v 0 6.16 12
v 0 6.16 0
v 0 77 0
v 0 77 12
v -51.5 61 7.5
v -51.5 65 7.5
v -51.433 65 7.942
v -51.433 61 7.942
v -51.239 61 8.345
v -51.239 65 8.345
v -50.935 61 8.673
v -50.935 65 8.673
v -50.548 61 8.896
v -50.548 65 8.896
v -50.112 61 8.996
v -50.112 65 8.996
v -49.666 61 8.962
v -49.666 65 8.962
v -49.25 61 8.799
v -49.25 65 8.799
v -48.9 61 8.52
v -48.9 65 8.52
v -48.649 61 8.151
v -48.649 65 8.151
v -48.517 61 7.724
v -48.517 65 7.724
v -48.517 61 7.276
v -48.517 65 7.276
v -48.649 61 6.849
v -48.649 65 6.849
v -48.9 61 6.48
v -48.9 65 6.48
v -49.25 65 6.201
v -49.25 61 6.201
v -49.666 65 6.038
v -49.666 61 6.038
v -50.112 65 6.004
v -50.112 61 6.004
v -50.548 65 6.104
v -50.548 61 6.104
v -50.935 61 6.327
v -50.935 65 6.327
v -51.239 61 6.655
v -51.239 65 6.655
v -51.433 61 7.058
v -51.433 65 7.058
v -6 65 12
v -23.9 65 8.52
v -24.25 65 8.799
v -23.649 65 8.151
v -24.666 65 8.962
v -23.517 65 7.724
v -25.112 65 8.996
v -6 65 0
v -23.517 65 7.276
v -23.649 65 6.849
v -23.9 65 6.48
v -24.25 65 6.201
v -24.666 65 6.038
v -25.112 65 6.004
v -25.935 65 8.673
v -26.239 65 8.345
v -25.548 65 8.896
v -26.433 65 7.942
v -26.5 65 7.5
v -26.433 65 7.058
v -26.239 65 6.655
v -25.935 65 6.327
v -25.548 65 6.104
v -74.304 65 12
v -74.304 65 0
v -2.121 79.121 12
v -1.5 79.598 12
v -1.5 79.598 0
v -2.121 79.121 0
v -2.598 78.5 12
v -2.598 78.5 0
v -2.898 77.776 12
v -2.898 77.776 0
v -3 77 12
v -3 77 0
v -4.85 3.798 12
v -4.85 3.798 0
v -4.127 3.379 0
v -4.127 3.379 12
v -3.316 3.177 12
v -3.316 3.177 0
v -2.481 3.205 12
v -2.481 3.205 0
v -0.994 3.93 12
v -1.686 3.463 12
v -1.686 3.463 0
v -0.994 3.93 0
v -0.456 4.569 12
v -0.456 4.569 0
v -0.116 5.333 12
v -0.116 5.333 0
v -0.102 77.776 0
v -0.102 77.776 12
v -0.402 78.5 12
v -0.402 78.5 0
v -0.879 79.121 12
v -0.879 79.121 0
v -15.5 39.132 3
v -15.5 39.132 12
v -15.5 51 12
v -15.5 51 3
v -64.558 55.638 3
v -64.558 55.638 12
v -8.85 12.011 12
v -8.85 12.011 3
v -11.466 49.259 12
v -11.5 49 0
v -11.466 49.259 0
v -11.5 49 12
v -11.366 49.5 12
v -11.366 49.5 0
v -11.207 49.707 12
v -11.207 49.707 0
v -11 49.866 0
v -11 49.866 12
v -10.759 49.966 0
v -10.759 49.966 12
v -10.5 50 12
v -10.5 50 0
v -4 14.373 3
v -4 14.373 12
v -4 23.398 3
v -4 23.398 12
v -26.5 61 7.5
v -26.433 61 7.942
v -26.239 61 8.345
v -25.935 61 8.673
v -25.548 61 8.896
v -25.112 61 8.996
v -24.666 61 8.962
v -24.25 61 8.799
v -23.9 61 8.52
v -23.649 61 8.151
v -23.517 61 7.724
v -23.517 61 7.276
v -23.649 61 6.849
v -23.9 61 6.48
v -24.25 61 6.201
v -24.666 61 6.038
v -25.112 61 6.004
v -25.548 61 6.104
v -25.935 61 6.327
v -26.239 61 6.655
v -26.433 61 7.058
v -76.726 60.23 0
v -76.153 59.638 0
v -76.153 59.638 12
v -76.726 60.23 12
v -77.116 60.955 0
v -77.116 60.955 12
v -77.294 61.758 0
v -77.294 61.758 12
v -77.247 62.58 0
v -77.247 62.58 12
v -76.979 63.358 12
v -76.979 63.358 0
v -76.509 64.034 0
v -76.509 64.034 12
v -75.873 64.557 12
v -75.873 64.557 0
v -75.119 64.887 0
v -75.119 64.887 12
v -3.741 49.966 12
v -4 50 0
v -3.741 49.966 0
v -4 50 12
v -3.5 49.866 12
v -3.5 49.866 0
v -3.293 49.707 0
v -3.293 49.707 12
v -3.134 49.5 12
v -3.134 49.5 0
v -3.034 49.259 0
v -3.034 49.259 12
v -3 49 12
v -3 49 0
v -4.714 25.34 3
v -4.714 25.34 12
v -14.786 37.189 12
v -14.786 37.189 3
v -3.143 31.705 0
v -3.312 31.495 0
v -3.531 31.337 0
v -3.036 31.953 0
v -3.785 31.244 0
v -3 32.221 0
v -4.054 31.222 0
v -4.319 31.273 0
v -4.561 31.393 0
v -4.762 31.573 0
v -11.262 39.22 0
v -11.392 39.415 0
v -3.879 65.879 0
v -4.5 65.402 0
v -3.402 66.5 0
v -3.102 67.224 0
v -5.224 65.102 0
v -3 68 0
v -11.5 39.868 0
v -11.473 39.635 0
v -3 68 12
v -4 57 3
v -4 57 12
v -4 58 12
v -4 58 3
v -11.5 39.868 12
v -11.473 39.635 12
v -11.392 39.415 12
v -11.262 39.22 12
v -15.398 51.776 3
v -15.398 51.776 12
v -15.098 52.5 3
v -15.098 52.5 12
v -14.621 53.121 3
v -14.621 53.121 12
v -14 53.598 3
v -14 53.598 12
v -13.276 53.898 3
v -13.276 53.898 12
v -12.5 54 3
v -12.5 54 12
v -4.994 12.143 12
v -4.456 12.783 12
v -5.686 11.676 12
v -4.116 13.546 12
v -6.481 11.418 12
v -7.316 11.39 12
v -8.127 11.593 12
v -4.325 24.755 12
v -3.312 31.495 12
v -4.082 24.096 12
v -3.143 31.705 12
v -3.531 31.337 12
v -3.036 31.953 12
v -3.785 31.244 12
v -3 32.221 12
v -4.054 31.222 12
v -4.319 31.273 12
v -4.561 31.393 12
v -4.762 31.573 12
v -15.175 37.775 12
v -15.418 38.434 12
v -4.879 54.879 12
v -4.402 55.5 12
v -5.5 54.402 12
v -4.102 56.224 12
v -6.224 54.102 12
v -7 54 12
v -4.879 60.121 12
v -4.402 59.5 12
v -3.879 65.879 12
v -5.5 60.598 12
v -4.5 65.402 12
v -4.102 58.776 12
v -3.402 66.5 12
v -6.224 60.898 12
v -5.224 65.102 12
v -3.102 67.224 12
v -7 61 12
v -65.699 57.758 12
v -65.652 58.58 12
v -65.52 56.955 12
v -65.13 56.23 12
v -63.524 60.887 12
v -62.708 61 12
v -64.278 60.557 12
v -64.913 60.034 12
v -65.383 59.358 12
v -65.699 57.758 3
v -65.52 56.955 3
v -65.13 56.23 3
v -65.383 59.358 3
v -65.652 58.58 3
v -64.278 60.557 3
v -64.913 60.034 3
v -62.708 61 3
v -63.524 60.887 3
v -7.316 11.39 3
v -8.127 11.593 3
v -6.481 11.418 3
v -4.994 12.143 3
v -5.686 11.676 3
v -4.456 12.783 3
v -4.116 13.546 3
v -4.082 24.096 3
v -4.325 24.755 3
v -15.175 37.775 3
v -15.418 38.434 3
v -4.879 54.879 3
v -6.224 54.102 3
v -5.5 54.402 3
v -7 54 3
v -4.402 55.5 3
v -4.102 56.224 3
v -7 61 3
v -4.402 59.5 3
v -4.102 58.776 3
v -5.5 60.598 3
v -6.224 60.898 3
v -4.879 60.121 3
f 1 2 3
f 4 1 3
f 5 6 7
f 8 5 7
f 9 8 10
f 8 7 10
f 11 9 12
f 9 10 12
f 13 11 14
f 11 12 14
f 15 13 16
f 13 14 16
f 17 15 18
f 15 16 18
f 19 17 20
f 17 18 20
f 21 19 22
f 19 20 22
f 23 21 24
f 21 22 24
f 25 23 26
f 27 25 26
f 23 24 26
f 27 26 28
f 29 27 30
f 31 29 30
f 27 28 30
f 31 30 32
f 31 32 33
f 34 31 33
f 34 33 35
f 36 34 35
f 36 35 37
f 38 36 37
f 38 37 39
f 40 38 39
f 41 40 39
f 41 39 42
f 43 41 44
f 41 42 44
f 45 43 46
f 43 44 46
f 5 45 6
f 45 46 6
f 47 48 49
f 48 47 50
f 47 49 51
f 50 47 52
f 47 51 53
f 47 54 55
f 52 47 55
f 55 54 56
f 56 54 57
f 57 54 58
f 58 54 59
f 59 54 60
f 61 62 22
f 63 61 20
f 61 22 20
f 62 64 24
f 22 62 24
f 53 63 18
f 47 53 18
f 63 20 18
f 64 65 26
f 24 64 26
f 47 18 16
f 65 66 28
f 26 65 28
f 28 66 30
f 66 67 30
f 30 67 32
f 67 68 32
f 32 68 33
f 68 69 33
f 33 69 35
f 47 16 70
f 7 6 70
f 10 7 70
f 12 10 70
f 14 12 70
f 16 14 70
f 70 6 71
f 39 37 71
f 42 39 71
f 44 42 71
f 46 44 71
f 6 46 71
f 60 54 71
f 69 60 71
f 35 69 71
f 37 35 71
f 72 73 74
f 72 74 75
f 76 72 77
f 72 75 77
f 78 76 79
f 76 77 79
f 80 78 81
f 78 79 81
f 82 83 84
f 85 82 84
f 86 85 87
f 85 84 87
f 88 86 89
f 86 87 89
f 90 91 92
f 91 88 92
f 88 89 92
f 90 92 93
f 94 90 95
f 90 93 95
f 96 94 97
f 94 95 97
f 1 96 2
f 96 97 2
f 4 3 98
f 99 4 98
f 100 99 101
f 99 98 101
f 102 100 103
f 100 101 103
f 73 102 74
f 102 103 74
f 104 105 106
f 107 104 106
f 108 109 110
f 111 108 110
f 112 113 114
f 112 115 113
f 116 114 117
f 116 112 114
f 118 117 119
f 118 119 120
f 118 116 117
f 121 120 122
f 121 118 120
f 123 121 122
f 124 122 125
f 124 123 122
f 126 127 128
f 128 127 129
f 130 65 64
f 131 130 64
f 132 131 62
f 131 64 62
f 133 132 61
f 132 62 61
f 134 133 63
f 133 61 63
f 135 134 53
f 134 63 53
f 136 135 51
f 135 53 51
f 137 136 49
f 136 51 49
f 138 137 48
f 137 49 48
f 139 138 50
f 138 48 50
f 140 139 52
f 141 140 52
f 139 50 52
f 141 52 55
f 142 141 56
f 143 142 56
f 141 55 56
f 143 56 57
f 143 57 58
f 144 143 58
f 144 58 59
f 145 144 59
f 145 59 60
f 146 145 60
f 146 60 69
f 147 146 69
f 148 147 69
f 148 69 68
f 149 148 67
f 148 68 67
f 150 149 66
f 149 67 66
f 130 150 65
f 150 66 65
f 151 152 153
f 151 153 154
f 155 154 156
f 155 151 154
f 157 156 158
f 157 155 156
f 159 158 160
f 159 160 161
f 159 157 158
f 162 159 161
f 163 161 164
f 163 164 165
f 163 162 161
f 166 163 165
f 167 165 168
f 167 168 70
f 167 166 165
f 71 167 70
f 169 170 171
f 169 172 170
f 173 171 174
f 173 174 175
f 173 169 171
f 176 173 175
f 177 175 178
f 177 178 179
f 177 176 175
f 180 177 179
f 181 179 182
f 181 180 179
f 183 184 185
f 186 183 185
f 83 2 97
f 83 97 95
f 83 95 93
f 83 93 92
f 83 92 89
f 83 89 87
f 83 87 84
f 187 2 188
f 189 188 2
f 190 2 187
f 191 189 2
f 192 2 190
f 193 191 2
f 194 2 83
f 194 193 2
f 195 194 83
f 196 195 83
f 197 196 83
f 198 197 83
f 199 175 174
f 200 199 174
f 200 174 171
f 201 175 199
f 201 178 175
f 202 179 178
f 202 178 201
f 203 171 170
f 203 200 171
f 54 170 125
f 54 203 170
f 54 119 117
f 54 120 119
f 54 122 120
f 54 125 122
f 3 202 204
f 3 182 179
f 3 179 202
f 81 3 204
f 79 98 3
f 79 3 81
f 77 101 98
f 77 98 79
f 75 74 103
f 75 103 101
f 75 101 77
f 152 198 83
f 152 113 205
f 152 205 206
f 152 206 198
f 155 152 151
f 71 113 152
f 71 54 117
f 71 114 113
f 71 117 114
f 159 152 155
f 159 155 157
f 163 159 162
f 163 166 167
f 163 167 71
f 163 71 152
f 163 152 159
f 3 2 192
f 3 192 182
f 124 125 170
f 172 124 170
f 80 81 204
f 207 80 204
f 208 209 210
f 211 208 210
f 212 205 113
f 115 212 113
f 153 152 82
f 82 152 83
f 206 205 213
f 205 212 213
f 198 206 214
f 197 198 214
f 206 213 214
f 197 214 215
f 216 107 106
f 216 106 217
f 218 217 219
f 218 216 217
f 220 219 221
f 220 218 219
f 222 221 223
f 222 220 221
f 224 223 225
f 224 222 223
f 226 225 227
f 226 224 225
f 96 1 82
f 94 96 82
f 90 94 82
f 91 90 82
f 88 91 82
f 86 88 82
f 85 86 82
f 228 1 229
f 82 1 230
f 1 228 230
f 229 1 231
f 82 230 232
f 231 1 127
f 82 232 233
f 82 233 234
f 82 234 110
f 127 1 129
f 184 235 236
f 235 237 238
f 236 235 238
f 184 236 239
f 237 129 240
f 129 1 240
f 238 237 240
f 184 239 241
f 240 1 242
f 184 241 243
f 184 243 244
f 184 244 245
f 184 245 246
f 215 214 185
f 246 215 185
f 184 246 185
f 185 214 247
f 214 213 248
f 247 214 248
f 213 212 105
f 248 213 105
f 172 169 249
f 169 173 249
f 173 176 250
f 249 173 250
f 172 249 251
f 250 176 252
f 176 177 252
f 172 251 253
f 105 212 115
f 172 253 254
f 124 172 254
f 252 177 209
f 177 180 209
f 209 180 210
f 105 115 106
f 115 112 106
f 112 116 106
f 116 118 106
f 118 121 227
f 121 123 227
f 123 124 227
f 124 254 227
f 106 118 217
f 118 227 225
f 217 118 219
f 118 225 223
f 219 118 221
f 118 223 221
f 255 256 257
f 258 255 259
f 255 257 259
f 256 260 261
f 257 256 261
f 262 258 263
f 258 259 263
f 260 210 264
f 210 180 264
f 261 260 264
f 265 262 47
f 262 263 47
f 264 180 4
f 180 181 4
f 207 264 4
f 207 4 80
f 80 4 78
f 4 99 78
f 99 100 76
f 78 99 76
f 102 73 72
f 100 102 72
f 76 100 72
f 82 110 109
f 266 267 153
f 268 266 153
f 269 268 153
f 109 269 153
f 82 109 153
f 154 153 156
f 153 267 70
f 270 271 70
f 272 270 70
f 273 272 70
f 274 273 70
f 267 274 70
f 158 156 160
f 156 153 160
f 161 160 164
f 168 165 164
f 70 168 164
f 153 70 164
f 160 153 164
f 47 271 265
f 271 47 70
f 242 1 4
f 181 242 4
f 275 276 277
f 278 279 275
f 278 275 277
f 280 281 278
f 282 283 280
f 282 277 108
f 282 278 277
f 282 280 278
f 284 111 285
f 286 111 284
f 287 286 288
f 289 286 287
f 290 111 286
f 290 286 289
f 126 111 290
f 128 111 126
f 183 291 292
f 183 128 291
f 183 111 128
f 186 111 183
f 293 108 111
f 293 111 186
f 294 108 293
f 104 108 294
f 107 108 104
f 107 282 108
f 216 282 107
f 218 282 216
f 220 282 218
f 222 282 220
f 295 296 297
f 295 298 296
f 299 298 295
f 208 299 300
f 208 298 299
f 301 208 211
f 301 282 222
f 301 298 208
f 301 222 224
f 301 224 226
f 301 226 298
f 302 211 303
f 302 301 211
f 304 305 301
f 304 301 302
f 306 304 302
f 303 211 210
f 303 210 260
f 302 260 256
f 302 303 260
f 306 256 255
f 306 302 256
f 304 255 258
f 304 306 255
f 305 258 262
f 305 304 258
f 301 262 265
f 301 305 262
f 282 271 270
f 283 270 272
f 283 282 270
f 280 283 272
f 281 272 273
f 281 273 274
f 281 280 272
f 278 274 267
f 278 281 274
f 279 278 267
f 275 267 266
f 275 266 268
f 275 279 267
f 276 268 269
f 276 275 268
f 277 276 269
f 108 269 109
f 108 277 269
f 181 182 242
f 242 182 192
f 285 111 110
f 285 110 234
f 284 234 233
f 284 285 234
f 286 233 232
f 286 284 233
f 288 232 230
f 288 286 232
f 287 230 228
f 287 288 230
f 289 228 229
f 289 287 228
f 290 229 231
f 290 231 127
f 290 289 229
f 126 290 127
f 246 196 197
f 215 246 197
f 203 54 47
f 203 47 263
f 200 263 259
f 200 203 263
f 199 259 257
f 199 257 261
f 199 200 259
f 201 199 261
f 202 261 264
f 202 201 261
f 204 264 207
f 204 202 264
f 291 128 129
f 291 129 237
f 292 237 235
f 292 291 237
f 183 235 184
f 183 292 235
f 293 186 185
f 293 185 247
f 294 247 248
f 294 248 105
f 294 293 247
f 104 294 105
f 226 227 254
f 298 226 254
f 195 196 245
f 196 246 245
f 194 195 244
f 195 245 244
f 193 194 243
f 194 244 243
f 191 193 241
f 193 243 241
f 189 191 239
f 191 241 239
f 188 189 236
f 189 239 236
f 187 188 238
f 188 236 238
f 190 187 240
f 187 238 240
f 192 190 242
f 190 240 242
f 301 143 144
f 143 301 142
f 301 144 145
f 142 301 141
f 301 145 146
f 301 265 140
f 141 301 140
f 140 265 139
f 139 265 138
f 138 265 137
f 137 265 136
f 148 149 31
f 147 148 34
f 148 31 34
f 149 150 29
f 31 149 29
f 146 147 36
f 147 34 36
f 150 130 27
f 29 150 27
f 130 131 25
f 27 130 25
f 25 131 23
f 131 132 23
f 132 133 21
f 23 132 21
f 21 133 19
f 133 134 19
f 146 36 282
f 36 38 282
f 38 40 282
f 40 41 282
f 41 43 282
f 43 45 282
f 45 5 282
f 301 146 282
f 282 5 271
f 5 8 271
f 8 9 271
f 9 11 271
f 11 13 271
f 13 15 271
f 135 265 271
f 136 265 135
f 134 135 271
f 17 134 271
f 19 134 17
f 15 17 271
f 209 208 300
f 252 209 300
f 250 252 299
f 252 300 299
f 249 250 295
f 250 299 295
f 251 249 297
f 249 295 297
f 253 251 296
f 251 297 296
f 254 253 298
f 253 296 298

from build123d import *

# Parameters (mm, degrees)
F1_DEPTH     = 12
F3_DEPTH     = 9
F4_R         = 1.5
F5_DEPTH     = 4
F6_T1_DEPTH  = 12
F6_T3_DEPTH  = 9
F6_T5_DEPTH  = 11.7568277192
F6_T7_DEPTH  = 16.5
F6_T9_DEPTH  = 11.7568277192
F6_T11_DEPTH = 55.4822209965
F6_T13_DEPTH = 27
F6_T15_DEPTH = 42.7993296961
F7_R         = 1


# Not quite as in the source:
# - a fillet or chamfer that OpenCascade refuses, or shapes differently, is made with other operations: its cross-section is extruded or revolved along the edge and cut away or added


with BuildPart() as f1:
    # F0 (on Top) → F1 (new body)
    with BuildSketch(Plane.XY):
        Polygon((-83, 65), (0, 0), (0, 80), (-3, 80), (-3, 65), align=None)
        Polygon((-11.5, 50), (-3, 50), (-3, 29.5), (-11.5, 39.5), align=None, mode=Mode.SUBTRACT)
    extrude(amount=F1_DEPTH)

    # F2 (on face) → F3 (cut)
    with BuildSketch(Plane.XY.offset(12)):
        Polygon((-4, 54), (-4, 61), (-71.4047410676, 61), (-4, 8.2131545856), (-4, 24.5002801184), (-15.5, 38.0296918831), (-15.5, 54), align=None)
    extrude(amount=-F3_DEPTH, mode=Mode.SUBTRACT)

    # F4 (on face) → F5 (cut)
    with BuildSketch(Plane(origin=(0, 65, 0), x_dir=(-1, 0, 0), z_dir=(0, 1, 0))):
        with Locations((50, 7.5)):
            Circle(F4_R)
        with Locations((25, 7.5)):
            Circle(F4_R)
    extrude(amount=-F5_DEPTH, mode=Mode.SUBTRACT)

    # F6: fillet of radius 3 on 12 edges, made by hand

    # F6_s2 → F6_t1 (join)
    with BuildSketch(Plane.XY):
        with BuildLine():
            ThreePointArc((-6, 65), (-3.8786796564, 65.8786796564), (-3, 68))
            Line((-3, 68), (-3, 65))
            Line((-3, 65), (-6, 65))
        make_face()
    extrude(amount=F6_T1_DEPTH)

    # F6_s4 → F6_t3 (join)
    with BuildSketch(Plane.XY.offset(3)):
        with BuildLine():
            ThreePointArc((-4, 57), (-4.8786796564, 54.8786796564), (-7, 54))
            Line((-7, 54), (-4, 54))
            Line((-4, 54), (-4, 57))
        make_face()
        with BuildLine():
            ThreePointArc((-4, 58), (-4.8786796564, 60.1213203436), (-7, 61))
            Line((-7, 61), (-4, 61))
            Line((-4, 61), (-4, 58))
        make_face()
        with BuildLine():
            ThreePointArc((-8.8496919869, 12.0111061416), (-5.6864315702, 11.6758853817), (-4, 14.3730205248))
            Line((-4, 14.3730205248), (-4, 8.2131545856))
            Line((-4, 8.2131545856), (-8.8496919869, 12.0111061416))
        make_face()
        with BuildLine():
            ThreePointArc((-62.7082968683, 61), (-65.544292562, 58.9783294052), (-64.5579888552, 55.6380856168))
            Line((-64.5579888552, 55.6380856168), (-71.4047410676, 61))
            Line((-71.4047410676, 61), (-62.7082968683, 61))
        make_face()
    extrude(amount=F6_T3_DEPTH)

    # F6_s6 → F6_t5 (join)
    with BuildSketch(Plane.XY.offset(0.2431722808)):
        with BuildLine():
            ThreePointArc((-4, 23.3975490307), (-4.1842004812, 24.4325722527), (-4.7141820467, 25.340494291))
            Line((-4.7141820467, 25.340494291), (-4, 24.5002801184))
            Line((-4, 24.5002801184), (-4, 23.3975490307))
        make_face()
    extrude(amount=F6_T5_DEPTH)

    # F6_s8 → F6_t7 (cut)
    with BuildSketch(Plane.XY.offset(3)):
        with BuildLine():
            ThreePointArc((-15.5, 51), (-14.6213203436, 53.1213203436), (-12.5, 54))
            Line((-12.5, 54), (-15.5, 54))
            Line((-15.5, 54), (-15.5, 51))
        make_face()
    extrude(amount=F6_T7_DEPTH, mode=Mode.SUBTRACT)

    # F6_s10 → F6_t9 (cut)
    with BuildSketch(Plane.XY.offset(3)):
        with BuildLine():
            ThreePointArc((-14.7858179533, 37.1894777105), (-15.3157995188, 38.0973997488), (-15.5, 39.1324229708))
            Line((-15.5, 39.1324229708), (-15.5, 38.0296918831))
            Line((-15.5, 38.0296918831), (-14.7858179533, 37.1894777105))
        make_face()
    extrude(amount=F6_T9_DEPTH, mode=Mode.SUBTRACT)

    # F6_s12 → F6_t11 (cut)
    with BuildSketch(Plane.XY.offset(-21.7411104983)):
        with BuildLine():
            ThreePointArc((-76.1532477876, 59.6380856168), (-77.1395514944, 62.9783294052), (-74.3035558007, 65))
            Line((-74.3035558007, 65), (-83, 65))
            Line((-83, 65), (-76.1532477876, 59.6380856168))
        make_face()
    extrude(amount=F6_T11_DEPTH, mode=Mode.SUBTRACT)

    # F6_s14 → F6_t13 (cut)
    with BuildSketch(Plane.XY.offset(-7.5)):
        with BuildLine():
            ThreePointArc((0, 80), (-2.1213203436, 79.1213203436), (-3, 77))
            Line((-3, 77), (-3, 80))
            Line((-3, 80), (0, 80))
        make_face()
        with BuildLine():
            ThreePointArc((0, 77), (-0.8786796564, 79.1213203436), (-3, 80))
            Line((-3, 80), (0, 80))
            Line((0, 80), (0, 77))
        make_face()
    extrude(amount=F6_T13_DEPTH, mode=Mode.SUBTRACT)

    # F6_s16 → F6_t15 (cut)
    with BuildSketch(Plane.XY.offset(-15.399664848)):
        with BuildLine():
            ThreePointArc((-4.8496919869, 3.797951556), (-1.6864315702, 3.4627307961), (0, 6.1598659392))
            Line((0, 6.1598659392), (0, 0))
            Line((0, 0), (-4.8496919869, 3.797951556))
        make_face()
    extrude(amount=F6_T15_DEPTH, mode=Mode.SUBTRACT)

    # F7
    f7_edges = [f1.edges().sort_by_distance(p)[0] for p in [
        (-11.5, 50, 6),
        (-3, 50, 6),
        (-11.5, 39.5, 6),
        (-3, 29.5, 6),
    ]]
    fillet(f7_edges, radius=F7_R)


solid = f1.part
